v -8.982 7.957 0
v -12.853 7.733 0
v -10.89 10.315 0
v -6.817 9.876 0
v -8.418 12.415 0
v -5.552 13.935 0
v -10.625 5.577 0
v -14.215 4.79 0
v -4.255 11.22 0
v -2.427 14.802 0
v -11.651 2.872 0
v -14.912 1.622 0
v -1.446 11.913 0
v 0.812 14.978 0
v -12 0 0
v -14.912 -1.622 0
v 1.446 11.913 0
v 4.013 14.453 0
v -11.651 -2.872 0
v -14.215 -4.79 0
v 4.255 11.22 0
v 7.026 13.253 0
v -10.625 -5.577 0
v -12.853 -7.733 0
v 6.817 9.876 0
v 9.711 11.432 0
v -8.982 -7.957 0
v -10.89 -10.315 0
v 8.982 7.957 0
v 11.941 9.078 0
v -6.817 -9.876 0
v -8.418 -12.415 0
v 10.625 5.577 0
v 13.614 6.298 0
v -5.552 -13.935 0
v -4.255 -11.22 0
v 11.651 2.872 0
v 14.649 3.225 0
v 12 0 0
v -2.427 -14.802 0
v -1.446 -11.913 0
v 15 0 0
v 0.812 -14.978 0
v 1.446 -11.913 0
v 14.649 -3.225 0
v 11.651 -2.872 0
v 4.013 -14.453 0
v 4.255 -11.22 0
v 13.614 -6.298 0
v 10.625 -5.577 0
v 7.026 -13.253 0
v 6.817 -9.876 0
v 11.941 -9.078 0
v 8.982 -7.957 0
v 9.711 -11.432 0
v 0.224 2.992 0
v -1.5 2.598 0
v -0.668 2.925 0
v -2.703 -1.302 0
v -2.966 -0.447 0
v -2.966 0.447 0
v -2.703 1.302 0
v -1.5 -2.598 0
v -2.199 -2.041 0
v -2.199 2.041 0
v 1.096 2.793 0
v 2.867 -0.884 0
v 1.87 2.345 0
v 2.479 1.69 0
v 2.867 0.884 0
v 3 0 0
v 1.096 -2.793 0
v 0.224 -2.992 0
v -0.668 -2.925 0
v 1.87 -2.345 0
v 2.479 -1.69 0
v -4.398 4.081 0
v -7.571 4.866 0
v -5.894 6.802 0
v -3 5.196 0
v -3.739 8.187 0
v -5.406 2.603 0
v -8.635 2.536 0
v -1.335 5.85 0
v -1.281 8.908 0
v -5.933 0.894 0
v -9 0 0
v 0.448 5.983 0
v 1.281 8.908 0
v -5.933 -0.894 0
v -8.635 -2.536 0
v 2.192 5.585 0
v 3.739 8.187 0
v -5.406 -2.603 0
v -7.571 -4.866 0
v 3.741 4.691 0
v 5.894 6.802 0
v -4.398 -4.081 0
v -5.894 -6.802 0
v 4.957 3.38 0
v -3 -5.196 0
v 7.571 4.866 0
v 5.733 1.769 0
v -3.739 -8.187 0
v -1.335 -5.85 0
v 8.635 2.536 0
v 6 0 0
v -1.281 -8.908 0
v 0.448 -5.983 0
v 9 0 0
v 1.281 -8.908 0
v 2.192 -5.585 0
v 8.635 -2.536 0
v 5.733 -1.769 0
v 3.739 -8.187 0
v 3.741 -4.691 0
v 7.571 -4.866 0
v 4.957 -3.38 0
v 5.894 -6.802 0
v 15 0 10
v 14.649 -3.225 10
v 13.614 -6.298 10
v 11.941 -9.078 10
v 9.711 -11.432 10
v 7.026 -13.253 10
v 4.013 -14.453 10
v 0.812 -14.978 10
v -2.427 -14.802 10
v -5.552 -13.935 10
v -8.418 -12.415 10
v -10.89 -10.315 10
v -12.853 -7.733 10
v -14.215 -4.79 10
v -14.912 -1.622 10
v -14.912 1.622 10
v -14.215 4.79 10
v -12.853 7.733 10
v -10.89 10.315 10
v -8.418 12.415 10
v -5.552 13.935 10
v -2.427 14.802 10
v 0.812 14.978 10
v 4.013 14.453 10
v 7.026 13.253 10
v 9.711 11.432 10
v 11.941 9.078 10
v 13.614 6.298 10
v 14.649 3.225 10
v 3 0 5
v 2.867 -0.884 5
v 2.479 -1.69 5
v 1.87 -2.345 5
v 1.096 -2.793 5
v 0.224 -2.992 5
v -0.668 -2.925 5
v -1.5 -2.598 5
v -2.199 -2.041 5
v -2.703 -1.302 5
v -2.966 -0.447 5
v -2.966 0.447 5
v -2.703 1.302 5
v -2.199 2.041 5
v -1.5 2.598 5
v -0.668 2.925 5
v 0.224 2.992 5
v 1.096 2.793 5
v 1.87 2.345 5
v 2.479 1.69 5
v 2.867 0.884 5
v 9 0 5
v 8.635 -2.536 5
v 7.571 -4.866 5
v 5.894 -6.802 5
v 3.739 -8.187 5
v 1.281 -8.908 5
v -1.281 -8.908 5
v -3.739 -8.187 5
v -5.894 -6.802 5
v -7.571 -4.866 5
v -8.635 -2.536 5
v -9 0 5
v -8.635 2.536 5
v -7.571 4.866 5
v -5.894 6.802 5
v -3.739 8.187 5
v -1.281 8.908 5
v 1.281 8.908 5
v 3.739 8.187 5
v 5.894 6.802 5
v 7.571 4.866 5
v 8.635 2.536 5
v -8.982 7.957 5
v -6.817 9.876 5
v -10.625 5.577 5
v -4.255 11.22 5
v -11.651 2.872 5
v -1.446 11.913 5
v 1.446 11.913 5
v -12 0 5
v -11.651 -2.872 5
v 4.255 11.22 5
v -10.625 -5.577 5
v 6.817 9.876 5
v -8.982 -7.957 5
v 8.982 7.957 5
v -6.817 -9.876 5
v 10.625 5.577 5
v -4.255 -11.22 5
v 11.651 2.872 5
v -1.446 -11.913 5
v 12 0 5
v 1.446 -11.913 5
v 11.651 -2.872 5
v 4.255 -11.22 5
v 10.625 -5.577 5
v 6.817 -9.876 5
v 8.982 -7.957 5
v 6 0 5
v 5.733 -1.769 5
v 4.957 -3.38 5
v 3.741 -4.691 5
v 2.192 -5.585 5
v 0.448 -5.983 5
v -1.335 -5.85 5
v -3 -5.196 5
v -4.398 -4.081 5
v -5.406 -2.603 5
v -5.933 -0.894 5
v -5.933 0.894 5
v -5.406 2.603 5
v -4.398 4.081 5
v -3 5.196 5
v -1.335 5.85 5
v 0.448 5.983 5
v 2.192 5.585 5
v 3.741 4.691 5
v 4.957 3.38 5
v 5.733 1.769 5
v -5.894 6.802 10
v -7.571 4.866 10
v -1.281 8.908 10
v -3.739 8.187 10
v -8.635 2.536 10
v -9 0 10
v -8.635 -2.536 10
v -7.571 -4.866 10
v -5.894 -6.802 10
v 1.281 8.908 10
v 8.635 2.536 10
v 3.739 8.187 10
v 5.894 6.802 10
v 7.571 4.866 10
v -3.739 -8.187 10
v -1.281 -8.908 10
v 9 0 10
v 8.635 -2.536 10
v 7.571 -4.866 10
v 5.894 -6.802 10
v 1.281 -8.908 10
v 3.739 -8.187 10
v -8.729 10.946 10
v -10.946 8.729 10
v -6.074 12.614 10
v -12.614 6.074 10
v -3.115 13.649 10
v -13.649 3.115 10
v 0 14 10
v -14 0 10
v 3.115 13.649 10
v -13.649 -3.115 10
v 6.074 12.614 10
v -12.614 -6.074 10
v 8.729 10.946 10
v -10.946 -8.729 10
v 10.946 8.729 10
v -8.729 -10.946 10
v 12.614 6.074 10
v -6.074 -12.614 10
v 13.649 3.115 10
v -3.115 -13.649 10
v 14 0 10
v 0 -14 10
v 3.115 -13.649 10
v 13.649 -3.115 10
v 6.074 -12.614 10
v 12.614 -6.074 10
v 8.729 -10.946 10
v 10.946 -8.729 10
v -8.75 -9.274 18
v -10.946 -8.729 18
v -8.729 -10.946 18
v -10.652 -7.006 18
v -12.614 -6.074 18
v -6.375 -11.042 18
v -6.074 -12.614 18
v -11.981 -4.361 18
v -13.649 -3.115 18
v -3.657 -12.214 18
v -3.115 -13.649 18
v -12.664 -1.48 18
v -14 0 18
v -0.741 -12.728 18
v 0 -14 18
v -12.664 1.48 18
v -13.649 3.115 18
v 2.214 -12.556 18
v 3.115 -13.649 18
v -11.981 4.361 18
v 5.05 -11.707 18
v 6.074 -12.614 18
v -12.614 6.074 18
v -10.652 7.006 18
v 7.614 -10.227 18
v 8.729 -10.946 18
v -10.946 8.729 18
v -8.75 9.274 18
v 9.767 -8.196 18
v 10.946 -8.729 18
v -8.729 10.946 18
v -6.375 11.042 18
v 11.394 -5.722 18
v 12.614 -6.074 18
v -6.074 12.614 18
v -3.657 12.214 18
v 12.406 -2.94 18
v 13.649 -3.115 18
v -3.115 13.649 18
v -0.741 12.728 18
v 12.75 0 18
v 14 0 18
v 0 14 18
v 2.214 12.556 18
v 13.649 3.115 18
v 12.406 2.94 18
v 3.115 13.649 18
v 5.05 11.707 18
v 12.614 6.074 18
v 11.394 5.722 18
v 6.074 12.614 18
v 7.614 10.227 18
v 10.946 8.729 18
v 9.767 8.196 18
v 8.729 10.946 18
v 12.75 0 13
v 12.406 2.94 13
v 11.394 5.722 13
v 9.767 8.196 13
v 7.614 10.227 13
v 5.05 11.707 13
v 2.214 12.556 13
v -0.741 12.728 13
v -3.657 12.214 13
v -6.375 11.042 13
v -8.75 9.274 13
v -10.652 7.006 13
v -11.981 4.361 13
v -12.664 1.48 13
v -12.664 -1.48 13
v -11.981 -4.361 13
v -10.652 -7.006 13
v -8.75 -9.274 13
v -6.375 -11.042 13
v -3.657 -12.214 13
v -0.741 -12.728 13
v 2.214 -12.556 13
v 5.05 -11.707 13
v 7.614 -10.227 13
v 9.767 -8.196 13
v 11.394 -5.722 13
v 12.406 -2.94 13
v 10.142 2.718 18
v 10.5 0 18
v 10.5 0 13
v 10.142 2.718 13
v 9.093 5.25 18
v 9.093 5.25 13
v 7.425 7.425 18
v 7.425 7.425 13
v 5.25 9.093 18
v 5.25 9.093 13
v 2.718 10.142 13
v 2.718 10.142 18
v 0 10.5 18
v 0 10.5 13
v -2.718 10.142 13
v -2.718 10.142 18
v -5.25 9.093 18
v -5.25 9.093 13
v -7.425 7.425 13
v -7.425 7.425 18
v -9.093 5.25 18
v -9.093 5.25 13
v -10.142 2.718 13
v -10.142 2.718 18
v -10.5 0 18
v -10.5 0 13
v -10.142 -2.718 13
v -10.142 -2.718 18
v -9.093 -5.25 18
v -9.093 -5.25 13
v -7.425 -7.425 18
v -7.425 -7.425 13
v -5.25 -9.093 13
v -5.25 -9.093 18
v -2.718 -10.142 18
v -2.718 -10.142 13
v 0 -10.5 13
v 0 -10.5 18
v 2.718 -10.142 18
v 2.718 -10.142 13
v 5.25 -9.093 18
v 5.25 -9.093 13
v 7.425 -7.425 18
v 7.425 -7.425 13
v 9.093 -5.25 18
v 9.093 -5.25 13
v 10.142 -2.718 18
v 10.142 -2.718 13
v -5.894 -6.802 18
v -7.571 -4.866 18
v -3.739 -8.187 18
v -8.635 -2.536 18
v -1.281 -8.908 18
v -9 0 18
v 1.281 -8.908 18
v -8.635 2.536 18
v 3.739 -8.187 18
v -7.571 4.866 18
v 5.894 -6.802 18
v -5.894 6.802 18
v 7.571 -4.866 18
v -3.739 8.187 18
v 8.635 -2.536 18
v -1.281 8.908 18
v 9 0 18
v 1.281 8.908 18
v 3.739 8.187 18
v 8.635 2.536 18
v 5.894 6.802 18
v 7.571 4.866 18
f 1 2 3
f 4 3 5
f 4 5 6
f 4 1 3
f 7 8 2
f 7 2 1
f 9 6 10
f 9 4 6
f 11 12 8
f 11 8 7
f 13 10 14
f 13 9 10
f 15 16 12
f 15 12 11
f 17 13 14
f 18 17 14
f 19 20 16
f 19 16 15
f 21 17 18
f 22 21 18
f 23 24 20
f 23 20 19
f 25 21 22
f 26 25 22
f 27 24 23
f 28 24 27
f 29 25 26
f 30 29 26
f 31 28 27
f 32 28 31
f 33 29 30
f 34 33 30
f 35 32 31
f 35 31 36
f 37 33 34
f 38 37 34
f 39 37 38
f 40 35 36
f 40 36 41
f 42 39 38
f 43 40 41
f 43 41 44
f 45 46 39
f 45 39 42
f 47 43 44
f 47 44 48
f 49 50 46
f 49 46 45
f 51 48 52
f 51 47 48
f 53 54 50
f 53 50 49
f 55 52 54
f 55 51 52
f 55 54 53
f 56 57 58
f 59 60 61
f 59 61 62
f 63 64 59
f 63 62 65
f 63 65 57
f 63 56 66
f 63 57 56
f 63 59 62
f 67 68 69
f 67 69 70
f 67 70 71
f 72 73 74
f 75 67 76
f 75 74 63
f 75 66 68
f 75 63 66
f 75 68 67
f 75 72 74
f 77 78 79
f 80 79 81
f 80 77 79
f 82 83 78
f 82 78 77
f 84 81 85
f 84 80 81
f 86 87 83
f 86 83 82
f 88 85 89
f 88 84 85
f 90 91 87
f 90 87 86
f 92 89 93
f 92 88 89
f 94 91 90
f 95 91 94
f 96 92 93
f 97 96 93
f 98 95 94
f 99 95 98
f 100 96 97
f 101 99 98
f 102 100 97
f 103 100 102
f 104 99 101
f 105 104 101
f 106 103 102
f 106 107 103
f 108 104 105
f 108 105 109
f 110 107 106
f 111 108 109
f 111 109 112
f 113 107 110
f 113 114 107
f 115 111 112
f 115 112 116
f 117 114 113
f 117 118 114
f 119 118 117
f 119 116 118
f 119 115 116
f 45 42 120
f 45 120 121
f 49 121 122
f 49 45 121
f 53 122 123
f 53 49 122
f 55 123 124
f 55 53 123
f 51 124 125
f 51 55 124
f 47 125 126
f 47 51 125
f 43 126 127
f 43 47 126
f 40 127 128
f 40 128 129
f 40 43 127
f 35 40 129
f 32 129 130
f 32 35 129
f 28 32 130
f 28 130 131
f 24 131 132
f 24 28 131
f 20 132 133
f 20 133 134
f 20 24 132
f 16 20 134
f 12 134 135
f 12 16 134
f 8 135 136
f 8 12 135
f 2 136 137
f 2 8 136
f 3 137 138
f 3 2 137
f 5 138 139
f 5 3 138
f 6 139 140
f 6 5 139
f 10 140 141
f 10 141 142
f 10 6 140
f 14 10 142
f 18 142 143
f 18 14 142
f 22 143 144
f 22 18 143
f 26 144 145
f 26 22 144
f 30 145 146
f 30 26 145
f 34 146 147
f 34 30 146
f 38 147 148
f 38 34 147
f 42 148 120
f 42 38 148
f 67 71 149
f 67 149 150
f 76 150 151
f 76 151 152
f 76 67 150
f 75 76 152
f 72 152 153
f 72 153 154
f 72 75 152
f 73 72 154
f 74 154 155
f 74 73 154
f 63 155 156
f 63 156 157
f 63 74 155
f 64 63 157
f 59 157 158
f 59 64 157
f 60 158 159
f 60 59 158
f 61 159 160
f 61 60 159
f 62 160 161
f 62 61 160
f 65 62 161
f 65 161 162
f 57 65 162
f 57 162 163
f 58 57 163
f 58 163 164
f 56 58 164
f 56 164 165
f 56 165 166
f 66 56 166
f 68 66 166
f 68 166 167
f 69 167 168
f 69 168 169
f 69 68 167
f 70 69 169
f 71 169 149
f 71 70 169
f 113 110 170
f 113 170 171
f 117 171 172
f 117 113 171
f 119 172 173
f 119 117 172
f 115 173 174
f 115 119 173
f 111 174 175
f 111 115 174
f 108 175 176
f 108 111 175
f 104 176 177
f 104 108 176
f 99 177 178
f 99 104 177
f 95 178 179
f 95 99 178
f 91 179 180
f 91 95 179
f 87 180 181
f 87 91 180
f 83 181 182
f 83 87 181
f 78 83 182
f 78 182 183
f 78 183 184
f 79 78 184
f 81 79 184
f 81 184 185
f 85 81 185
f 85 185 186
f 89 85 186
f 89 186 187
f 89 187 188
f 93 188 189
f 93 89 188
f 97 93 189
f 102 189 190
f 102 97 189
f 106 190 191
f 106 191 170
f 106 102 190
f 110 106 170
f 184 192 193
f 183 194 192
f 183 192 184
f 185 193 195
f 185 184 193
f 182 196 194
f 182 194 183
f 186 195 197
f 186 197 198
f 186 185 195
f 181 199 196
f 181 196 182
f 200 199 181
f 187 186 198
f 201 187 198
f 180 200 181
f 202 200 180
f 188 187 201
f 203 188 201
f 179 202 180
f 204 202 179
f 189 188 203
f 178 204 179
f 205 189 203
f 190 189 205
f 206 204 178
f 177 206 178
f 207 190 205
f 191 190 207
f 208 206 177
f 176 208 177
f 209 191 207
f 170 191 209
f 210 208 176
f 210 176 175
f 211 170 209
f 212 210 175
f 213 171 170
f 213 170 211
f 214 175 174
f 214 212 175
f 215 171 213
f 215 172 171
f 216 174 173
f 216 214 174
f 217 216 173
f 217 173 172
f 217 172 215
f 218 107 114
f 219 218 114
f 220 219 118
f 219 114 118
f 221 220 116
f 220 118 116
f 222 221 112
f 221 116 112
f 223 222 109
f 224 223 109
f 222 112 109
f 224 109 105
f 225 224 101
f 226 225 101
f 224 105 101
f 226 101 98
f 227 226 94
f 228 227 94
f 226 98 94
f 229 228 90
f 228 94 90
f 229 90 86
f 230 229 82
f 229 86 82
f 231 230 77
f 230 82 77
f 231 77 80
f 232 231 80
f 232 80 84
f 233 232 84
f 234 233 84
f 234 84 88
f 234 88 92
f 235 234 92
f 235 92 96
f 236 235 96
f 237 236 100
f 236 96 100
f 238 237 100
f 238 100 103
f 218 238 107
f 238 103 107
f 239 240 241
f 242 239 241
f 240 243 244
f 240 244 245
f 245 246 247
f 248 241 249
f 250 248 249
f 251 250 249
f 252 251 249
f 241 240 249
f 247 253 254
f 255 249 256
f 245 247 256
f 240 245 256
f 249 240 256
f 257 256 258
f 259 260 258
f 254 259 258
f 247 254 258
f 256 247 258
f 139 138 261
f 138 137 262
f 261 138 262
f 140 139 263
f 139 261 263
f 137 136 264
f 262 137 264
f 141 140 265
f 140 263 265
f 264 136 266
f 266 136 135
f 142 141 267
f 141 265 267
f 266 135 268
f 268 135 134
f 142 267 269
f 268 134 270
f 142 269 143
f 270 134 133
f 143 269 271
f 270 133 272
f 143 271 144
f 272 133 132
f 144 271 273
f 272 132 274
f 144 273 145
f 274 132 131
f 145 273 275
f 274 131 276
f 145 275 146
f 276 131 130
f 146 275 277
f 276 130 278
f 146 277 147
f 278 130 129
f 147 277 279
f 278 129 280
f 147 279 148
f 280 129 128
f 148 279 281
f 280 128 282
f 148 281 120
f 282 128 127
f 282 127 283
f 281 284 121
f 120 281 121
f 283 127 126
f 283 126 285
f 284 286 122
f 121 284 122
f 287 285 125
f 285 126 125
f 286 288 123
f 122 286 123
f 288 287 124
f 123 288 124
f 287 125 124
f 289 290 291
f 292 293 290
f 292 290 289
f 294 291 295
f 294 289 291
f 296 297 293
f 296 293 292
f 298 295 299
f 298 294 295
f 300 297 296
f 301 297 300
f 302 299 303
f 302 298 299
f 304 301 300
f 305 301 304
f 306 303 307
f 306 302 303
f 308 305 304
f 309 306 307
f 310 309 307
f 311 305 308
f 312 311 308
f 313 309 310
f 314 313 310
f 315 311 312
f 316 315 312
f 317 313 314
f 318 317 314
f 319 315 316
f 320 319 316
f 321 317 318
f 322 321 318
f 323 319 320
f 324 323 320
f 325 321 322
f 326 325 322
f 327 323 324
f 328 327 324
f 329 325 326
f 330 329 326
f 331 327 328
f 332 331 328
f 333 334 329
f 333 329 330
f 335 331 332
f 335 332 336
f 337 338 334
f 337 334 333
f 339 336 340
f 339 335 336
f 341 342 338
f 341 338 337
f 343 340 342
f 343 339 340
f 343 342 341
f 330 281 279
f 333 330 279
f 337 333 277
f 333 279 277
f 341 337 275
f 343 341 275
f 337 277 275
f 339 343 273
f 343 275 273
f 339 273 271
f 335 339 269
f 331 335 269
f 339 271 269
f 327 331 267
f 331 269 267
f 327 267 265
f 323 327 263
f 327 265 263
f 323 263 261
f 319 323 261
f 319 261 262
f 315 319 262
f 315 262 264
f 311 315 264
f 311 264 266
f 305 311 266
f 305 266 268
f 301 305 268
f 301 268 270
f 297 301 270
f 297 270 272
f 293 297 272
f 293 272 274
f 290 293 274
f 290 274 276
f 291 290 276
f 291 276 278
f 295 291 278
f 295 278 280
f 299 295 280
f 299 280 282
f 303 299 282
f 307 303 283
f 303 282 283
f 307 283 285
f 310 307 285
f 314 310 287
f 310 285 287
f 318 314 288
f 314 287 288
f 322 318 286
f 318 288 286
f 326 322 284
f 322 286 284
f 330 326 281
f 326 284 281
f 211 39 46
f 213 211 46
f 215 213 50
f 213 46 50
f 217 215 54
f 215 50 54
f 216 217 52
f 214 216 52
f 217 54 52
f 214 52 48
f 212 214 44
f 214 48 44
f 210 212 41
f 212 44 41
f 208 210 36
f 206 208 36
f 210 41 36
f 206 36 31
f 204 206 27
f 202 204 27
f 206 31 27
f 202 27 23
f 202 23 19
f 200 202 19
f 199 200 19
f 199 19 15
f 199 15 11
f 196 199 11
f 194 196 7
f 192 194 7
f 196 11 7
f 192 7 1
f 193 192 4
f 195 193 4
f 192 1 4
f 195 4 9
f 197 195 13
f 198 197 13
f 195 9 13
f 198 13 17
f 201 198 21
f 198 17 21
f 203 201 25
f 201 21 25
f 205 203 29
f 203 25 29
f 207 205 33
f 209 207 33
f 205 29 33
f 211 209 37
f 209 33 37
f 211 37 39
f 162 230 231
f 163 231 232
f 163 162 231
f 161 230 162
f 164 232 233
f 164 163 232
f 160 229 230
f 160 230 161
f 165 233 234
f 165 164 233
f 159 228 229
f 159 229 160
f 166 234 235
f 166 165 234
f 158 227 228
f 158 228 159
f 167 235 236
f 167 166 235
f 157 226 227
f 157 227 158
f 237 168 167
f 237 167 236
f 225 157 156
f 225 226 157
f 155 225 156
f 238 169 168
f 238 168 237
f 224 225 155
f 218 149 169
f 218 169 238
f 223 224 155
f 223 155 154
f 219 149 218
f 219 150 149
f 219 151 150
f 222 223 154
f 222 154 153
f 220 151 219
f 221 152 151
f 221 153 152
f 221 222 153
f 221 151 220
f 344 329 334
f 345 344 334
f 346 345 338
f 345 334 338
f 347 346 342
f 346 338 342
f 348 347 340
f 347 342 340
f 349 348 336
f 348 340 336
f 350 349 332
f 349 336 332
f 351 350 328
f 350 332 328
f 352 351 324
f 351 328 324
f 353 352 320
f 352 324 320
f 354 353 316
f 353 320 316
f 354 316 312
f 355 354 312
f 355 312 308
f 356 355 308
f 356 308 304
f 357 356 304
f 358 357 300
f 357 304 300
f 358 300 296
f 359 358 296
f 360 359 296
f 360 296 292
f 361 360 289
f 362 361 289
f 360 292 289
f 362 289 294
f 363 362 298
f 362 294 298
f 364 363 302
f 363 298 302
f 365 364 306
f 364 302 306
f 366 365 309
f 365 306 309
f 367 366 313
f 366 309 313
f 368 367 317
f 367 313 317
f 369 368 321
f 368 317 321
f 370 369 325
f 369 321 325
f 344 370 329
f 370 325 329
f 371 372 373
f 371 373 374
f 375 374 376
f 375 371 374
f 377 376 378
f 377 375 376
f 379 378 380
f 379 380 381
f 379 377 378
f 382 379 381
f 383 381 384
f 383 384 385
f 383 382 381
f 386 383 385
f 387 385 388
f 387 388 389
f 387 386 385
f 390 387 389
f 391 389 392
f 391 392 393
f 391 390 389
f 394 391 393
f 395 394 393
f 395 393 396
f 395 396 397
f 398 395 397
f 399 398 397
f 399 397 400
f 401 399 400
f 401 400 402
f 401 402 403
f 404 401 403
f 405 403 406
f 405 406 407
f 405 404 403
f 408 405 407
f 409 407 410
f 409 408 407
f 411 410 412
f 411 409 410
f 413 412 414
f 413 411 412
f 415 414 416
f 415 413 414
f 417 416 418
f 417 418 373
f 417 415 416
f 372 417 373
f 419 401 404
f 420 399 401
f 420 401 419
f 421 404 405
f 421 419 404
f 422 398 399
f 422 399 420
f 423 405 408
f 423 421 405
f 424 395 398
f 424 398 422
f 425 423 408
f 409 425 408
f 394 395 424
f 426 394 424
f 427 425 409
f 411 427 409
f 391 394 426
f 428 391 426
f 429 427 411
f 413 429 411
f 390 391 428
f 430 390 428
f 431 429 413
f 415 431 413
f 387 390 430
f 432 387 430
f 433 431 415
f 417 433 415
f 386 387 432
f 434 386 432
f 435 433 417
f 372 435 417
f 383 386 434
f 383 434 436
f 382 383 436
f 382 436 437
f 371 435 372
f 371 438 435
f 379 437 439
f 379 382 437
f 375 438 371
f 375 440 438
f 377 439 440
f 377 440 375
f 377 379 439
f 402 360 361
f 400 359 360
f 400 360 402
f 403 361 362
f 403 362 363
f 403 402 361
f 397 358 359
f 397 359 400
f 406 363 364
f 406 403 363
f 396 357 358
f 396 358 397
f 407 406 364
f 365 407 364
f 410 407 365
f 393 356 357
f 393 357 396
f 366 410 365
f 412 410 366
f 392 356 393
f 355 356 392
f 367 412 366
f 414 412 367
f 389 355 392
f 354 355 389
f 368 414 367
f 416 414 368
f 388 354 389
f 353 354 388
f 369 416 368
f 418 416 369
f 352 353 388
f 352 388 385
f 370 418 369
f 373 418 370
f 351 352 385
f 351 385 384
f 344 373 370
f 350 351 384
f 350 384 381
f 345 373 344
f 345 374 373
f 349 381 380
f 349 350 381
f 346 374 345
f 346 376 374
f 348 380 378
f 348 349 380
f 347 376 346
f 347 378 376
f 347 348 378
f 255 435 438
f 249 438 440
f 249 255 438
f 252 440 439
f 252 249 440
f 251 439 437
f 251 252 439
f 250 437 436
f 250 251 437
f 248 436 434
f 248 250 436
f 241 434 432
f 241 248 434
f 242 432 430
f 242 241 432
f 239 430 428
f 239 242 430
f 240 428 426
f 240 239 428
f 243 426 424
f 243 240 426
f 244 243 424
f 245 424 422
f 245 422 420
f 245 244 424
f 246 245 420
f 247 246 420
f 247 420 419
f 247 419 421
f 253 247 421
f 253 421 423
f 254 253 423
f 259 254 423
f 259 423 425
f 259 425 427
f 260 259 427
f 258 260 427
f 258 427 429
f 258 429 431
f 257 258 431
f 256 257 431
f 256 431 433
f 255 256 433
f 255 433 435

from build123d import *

# Parameters (mm, degrees)
F0_R     = 14
F0_R_2   = 9
F1_DEPTH = 18
F2_R     = 15
F3_DEPTH = 10
F4_R     = 12.75
F4_R_2   = 10.5
F5_DEPTH = 5
F6_R     = 6
F6_R_2   = 3
F7_DEPTH = 5
F8_R     = 12
F8_R_2   = 9
F9_DEPTH = 5


with BuildPart() as f1:
    # F0 (on Top) → F1 (new body)
    with BuildSketch(Plane.XY):
        Circle(F0_R)
        Circle(F0_R_2, mode=Mode.SUBTRACT)
    extrude(amount=F1_DEPTH)

    # F2 (on face) → F3 (join)
    with BuildSketch(Plane(origin=(0, 0, 0), x_dir=(1, 0, 0), z_dir=(0, 0, -1))):
        Circle(F2_R)
    extrude(amount=-F3_DEPTH)

    # F4 (on face) → F5 (cut)
    with BuildSketch(Plane.XY.offset(18)):
        Circle(F4_R)
        Circle(F4_R_2, mode=Mode.SUBTRACT)
    extrude(amount=-F5_DEPTH, mode=Mode.SUBTRACT)

    # F6 (on face) → F7 (cut)
    with BuildSketch(Plane(origin=(0, 0, 0), x_dir=(1, 0, 0), z_dir=(0, 0, -1))):
        Circle(F6_R)
        Circle(F6_R_2, mode=Mode.SUBTRACT)
    extrude(amount=-F7_DEPTH, mode=Mode.SUBTRACT)

    # F8 (on face) → F9 (cut)
    with BuildSketch(Plane(origin=(0, 0, 0), x_dir=(1, 0, 0), z_dir=(0, 0, -1))):
        Circle(F8_R)
        Circle(F8_R_2, mode=Mode.SUBTRACT)
    extrude(amount=-F9_DEPTH, mode=Mode.SUBTRACT)


solid = f1.part
